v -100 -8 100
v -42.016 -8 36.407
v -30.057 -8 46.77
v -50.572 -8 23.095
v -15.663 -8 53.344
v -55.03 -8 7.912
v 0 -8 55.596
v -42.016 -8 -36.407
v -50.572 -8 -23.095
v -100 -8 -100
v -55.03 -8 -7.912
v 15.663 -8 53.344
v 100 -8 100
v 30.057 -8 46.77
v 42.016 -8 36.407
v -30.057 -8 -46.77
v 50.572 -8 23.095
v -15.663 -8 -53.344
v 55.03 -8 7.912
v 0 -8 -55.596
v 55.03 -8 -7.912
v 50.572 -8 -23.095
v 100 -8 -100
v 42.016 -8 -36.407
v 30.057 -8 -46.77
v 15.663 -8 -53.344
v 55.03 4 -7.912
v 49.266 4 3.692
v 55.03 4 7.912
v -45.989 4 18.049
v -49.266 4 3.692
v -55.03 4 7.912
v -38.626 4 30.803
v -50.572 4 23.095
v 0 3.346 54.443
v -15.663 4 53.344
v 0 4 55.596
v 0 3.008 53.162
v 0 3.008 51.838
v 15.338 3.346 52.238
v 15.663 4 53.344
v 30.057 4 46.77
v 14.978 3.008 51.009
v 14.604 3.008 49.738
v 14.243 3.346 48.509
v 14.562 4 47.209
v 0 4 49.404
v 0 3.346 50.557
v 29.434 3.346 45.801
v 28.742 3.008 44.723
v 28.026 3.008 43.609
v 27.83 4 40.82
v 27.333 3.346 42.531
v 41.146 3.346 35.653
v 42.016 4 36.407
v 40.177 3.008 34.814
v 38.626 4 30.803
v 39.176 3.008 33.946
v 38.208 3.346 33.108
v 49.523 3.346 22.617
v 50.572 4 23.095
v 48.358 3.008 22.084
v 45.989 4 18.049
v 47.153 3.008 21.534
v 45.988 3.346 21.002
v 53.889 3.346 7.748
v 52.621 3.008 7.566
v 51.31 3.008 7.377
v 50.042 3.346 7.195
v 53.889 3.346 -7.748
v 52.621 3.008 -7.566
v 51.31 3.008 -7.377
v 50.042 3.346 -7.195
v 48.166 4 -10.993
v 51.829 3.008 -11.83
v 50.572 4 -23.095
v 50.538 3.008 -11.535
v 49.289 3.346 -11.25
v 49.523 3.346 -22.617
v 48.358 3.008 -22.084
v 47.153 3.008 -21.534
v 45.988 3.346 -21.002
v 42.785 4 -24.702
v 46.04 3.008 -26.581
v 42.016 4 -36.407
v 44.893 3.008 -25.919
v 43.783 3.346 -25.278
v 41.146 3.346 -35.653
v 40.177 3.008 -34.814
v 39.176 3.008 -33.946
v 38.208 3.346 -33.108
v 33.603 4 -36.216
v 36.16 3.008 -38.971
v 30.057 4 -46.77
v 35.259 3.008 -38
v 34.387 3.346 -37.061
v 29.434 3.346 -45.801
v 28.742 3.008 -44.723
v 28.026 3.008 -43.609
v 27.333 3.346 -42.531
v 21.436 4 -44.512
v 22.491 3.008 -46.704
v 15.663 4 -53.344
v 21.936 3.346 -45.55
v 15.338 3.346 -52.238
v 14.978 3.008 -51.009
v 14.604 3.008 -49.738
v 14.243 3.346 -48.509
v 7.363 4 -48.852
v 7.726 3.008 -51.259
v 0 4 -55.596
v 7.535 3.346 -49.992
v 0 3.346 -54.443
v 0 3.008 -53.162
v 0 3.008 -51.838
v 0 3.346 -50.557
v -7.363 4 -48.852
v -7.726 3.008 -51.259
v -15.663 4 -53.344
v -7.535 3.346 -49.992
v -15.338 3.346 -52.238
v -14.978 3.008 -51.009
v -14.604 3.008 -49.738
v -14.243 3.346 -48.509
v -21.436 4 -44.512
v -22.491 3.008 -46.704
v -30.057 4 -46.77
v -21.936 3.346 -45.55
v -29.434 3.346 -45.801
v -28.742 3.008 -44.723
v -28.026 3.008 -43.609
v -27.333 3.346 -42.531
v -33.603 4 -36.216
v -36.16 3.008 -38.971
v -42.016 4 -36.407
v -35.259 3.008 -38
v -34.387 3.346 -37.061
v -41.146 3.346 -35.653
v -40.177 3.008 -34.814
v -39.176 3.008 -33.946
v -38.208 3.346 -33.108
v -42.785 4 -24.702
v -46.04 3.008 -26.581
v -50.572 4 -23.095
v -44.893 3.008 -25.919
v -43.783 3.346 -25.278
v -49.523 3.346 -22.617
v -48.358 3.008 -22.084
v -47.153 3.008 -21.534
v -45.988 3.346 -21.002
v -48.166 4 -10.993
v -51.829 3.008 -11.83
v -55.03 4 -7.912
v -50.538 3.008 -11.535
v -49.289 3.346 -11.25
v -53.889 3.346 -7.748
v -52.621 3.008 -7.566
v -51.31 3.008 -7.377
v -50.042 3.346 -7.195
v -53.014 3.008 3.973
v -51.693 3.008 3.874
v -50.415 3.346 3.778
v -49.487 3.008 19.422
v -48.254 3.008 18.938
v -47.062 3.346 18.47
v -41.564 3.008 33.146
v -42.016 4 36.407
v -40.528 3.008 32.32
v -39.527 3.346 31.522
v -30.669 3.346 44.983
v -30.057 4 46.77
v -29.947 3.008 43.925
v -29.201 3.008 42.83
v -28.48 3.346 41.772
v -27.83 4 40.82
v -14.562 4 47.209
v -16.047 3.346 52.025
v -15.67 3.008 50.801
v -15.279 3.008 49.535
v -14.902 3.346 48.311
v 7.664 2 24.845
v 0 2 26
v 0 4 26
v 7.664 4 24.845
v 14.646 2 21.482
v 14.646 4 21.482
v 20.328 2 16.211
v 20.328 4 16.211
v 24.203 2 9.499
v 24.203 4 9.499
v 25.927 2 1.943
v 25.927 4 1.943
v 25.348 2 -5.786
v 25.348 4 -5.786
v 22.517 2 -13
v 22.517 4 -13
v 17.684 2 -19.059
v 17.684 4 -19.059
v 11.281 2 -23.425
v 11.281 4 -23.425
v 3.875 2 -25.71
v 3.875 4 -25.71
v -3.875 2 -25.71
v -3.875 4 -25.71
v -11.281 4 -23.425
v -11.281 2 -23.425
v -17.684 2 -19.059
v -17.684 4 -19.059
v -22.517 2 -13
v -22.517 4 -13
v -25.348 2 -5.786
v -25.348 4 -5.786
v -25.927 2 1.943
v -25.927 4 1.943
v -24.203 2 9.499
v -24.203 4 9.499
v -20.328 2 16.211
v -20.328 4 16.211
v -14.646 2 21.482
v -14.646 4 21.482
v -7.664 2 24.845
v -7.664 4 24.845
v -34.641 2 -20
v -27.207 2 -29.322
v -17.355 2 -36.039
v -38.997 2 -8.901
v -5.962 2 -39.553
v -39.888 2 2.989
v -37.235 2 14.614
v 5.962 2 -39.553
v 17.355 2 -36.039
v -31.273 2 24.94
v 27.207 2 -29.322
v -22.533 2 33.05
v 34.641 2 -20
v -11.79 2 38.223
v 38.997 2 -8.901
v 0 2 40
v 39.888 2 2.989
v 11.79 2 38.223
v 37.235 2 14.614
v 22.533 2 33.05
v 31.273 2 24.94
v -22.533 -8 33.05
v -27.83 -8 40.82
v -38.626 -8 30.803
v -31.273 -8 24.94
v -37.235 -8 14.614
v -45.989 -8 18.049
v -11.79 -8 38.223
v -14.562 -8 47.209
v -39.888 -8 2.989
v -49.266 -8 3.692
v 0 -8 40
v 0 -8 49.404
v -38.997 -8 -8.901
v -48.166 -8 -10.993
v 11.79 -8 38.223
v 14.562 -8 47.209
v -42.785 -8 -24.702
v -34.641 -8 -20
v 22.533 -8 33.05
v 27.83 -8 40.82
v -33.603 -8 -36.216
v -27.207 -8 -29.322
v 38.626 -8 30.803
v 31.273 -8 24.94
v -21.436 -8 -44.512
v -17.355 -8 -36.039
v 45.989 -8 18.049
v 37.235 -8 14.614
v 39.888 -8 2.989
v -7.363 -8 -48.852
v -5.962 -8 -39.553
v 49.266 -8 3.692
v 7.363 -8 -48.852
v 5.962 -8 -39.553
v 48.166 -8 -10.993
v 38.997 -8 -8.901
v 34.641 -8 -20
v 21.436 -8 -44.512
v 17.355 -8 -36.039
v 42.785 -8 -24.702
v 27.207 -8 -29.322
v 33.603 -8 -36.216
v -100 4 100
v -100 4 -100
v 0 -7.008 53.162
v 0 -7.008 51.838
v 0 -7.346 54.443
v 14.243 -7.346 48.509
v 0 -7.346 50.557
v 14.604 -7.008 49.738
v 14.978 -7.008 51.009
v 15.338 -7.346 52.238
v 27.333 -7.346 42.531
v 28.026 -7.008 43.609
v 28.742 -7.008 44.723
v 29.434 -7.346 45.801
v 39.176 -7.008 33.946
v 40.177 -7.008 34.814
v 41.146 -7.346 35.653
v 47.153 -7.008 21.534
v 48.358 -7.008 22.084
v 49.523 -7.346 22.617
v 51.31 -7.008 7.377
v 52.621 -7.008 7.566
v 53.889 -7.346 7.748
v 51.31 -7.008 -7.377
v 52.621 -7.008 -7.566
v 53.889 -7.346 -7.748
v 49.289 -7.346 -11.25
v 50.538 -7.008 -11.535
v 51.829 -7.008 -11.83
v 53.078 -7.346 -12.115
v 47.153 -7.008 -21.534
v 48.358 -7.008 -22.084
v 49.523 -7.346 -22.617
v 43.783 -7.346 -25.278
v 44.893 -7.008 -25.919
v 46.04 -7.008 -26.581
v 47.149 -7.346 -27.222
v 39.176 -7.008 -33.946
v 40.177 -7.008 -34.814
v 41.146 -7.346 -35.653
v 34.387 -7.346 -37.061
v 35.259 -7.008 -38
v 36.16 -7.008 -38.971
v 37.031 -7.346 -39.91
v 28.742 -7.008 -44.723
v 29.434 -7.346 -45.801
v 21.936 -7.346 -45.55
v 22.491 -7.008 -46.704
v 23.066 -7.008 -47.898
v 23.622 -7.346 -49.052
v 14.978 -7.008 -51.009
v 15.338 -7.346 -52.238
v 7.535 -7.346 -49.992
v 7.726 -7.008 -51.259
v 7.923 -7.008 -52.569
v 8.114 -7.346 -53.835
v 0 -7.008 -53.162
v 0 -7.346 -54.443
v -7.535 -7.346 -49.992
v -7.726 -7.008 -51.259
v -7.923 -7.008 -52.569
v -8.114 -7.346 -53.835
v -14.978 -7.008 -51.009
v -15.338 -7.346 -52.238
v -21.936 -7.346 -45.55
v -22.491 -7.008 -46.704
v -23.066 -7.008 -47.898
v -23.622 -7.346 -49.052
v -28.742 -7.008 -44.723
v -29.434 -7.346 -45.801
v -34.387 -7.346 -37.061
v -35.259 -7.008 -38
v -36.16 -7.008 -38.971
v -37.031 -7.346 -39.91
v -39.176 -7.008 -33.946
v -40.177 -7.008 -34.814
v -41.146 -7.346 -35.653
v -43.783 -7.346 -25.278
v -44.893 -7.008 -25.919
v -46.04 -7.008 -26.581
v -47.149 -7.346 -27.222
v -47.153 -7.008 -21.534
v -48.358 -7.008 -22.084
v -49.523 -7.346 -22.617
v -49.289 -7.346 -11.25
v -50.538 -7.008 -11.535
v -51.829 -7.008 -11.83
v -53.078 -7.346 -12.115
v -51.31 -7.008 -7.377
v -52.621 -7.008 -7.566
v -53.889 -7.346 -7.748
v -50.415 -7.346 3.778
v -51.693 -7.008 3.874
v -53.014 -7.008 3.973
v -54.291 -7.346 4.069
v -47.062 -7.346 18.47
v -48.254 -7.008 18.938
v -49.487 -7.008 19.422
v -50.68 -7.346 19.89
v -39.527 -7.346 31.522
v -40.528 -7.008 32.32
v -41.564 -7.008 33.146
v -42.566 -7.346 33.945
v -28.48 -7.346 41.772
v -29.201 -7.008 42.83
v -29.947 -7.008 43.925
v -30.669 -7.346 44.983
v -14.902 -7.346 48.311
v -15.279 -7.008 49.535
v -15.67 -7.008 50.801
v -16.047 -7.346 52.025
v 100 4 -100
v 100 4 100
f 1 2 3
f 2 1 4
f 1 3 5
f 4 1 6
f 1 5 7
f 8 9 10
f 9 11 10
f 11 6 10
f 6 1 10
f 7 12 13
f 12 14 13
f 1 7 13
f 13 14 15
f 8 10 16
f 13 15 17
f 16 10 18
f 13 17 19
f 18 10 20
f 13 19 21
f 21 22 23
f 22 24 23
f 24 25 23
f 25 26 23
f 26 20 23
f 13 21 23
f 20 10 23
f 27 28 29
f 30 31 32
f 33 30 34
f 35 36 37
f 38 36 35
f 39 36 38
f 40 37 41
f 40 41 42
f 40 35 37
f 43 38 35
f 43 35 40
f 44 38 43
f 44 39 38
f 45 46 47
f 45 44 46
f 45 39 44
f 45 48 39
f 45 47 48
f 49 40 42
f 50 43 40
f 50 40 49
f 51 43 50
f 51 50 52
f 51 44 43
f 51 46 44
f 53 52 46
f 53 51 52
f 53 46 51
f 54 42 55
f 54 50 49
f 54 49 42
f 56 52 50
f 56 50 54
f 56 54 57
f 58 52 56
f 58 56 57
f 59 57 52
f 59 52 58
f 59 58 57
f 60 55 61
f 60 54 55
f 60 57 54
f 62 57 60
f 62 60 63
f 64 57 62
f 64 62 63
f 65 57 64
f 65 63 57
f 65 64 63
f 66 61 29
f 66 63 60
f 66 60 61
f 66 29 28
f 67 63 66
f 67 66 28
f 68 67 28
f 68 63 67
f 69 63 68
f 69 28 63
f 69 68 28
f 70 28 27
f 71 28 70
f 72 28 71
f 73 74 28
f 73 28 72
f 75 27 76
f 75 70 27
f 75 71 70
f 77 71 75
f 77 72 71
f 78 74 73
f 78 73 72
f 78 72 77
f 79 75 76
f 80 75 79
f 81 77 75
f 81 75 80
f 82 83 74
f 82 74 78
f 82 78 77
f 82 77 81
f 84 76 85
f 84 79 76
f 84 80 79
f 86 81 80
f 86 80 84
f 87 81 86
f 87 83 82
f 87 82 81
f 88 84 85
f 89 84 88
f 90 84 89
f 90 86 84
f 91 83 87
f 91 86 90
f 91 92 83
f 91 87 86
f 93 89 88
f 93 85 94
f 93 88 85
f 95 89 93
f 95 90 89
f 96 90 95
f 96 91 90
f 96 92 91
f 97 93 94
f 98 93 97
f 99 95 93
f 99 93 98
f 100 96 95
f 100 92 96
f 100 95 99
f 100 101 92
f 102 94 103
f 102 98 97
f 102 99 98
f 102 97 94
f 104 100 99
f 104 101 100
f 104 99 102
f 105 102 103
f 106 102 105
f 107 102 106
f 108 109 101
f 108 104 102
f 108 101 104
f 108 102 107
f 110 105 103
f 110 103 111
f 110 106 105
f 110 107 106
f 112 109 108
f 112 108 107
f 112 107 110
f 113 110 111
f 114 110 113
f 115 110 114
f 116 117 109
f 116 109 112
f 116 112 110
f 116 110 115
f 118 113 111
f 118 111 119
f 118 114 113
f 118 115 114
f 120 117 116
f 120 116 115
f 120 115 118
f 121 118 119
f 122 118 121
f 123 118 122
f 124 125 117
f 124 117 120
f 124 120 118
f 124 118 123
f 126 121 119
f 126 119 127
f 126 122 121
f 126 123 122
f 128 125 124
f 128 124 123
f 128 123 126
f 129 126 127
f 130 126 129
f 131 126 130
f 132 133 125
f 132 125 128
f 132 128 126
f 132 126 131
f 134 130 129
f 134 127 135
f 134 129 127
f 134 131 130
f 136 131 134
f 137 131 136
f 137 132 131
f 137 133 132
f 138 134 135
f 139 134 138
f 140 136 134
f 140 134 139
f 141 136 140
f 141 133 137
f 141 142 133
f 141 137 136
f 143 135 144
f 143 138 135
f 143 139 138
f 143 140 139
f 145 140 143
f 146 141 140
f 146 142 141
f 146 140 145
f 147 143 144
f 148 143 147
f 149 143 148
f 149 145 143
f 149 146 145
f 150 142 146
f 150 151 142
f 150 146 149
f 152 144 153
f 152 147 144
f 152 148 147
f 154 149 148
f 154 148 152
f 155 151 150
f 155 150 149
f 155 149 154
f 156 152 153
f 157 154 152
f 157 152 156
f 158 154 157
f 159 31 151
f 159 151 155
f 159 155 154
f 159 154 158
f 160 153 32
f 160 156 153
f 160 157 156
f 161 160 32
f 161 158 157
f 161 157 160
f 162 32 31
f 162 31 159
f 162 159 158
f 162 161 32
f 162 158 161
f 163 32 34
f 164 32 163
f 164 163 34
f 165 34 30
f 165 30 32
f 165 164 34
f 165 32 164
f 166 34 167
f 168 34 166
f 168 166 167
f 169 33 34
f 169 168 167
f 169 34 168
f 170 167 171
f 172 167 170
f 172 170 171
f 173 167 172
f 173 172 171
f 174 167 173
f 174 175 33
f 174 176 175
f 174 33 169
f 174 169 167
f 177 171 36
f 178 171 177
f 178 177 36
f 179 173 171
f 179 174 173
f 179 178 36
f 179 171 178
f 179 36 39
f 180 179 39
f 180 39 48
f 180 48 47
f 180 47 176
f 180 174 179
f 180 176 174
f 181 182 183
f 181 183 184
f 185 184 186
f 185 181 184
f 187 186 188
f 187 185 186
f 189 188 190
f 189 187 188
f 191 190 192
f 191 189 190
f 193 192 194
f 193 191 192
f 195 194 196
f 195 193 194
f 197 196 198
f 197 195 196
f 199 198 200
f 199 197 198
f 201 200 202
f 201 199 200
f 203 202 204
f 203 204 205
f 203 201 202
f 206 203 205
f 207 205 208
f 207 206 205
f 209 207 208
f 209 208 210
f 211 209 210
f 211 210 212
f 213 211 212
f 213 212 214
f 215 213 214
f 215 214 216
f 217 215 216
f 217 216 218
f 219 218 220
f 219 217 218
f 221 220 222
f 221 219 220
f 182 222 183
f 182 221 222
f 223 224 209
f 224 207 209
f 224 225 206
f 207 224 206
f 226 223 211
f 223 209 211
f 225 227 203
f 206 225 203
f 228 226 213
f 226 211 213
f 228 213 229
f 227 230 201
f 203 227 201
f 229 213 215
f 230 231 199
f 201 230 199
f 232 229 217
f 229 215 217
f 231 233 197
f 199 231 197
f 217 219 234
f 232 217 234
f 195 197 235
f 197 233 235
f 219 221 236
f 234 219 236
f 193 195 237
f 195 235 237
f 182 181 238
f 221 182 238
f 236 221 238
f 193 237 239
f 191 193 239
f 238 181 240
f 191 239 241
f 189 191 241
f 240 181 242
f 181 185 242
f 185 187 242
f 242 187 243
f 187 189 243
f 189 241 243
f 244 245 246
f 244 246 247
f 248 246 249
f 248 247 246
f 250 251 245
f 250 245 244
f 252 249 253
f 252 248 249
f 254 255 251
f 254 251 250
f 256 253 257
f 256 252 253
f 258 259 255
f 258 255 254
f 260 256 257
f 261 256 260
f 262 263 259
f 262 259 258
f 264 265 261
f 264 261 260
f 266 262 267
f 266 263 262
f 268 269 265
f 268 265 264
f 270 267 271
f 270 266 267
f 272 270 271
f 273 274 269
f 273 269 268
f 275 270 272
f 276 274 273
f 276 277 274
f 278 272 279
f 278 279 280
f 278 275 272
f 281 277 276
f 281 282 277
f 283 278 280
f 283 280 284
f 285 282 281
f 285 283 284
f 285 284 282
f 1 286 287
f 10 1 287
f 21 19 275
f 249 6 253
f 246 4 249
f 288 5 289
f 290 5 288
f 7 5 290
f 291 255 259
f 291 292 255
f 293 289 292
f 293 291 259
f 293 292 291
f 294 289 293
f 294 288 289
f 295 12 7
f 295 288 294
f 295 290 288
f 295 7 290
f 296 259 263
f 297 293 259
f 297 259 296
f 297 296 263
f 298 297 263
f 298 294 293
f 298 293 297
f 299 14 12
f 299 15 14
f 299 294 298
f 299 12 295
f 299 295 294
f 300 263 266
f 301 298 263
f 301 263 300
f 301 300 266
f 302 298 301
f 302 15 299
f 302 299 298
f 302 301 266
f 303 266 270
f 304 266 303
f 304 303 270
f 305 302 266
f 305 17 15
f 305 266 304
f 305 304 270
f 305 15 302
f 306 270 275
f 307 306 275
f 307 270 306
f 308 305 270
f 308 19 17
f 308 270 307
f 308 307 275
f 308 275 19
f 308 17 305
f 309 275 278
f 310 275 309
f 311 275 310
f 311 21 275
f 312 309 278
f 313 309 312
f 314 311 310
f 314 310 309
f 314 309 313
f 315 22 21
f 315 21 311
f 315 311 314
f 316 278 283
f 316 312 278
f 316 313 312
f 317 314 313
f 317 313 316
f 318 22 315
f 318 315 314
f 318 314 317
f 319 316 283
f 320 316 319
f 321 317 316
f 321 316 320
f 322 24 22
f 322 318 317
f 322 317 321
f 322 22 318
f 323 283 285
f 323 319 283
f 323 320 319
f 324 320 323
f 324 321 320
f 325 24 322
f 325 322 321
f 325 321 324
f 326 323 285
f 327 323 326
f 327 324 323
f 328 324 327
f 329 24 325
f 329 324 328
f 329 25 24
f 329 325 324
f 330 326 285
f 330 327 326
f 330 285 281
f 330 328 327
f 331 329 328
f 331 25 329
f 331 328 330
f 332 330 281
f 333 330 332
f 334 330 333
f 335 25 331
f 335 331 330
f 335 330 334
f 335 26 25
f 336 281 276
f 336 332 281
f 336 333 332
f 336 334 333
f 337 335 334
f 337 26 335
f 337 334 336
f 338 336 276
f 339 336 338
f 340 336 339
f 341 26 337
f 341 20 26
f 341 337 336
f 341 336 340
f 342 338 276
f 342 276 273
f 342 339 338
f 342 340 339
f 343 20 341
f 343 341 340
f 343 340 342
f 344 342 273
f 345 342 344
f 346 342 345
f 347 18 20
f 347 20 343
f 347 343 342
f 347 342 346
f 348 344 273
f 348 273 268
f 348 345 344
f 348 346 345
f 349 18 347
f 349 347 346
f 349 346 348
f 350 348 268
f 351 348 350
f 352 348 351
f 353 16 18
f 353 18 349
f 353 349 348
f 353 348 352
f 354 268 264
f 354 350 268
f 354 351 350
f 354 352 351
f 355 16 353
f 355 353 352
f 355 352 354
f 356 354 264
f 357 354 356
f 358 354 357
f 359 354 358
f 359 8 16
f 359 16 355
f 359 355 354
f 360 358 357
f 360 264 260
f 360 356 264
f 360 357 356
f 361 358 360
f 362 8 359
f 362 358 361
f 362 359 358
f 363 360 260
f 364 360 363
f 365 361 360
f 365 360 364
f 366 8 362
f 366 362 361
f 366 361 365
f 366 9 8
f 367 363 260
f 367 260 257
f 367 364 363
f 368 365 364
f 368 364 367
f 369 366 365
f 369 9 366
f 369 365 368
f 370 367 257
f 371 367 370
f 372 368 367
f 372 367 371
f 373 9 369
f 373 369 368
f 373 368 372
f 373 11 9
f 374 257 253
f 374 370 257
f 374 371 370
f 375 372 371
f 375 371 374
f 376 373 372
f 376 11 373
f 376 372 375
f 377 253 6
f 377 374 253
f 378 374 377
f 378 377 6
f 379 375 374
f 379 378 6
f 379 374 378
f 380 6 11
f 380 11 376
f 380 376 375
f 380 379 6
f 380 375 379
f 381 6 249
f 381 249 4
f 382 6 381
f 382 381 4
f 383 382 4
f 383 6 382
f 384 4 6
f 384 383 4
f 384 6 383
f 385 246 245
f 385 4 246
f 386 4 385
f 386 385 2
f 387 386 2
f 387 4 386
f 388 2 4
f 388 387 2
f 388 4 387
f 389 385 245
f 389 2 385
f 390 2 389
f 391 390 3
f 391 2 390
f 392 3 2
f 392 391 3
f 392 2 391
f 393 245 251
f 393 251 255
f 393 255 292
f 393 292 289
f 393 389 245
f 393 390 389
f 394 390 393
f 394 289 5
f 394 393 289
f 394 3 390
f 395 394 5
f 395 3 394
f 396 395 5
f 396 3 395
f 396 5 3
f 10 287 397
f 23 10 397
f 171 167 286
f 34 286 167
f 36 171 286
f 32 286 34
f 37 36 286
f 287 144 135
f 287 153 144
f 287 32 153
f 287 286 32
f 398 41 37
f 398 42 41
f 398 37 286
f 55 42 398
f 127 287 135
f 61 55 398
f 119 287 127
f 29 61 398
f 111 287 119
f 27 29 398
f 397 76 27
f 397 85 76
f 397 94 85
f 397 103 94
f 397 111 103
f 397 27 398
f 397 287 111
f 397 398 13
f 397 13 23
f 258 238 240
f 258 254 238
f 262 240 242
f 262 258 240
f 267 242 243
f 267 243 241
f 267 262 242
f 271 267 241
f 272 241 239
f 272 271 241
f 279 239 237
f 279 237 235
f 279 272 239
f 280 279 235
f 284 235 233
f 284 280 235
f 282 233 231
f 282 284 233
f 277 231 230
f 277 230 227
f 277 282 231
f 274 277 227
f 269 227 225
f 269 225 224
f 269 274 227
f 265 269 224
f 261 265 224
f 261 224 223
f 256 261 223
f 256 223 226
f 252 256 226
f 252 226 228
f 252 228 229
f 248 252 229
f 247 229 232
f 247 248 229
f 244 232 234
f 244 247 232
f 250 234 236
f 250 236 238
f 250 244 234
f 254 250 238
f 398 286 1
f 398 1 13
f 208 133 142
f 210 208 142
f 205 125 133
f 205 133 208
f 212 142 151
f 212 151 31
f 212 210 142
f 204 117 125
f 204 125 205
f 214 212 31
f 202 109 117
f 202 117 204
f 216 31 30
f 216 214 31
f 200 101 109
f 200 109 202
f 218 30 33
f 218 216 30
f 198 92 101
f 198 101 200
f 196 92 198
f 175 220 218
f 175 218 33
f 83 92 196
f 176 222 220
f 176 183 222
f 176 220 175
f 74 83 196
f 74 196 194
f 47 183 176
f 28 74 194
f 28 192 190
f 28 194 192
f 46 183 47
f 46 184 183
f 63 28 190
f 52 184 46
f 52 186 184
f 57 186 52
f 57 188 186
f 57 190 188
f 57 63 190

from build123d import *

# Parameters (mm, degrees)
SKETCH2_W           = 200
SKETCH2_H           = 200
SKETCH2_R           = 60
BOSS_EXTRUDE1_DEPTH = 12
BOSS_EXTRUDE2_START = -2
SKETCH3_R           = 40
SKETCH3_R_2         = 26
BOSS_EXTRUDE2_DEPTH = 2


with BuildPart() as part:
    # Sketch1 → Revolve1 (revolve)
    with BuildSketch(Plane(origin=(0, 0, 0), x_dir=(-1, 0, 0), z_dir=(0, 0, -1)), mode=Mode.PRIVATE) as revolve1_sk:
        with BuildLine():
            Line((-40, 4), (-40, -8))
            Line((-40, -8), (-49.4043, -8))
            ThreePointArc((-49.4043, -8), (-52.5, -6.965718833), (-55.5957, -8))
            Line((-55.5957, -8), (-60, -8))
            Line((-60, -8), (-60, 4))
            Line((-60, 4), (-55.5957, 4))
            ThreePointArc((-55.5957, 4), (-52.5, 2.965718833), (-49.4043, 4))
            Line((-49.4043, 4), (-40, 4))
        make_face()
    revolve(revolve1_sk.sketch.rotate(Axis((0, 0, 0), (0, 1, 0)), 270), axis=Axis((0, 0, 0), (0, 1, 0)))

    # Sketch2 → Boss-Extrude1 (add)
    with BuildSketch(Plane(origin=(0, 4, 0), x_dir=(1, 0, 0), z_dir=(0, 1, 0))):
        Rectangle(SKETCH2_W, SKETCH2_H)
        Circle(SKETCH2_R, mode=Mode.SUBTRACT)
    extrude(amount=-BOSS_EXTRUDE1_DEPTH)

    # Sketch3 → Boss-Extrude2 (add)
    with BuildSketch(Plane(origin=(0, 4, 0), x_dir=(1, 0, 0), z_dir=(0, 1, 0)).offset(BOSS_EXTRUDE2_START)):
        with Locations(Location((0, 0, 0), (0, 0, 270))):
            Circle(SKETCH3_R)
        with Locations(Location((0, 0, 0), (0, 0, 270))):
            Circle(SKETCH3_R_2, mode=Mode.SUBTRACT)
    extrude(amount=BOSS_EXTRUDE2_DEPTH)


solid = part.part
